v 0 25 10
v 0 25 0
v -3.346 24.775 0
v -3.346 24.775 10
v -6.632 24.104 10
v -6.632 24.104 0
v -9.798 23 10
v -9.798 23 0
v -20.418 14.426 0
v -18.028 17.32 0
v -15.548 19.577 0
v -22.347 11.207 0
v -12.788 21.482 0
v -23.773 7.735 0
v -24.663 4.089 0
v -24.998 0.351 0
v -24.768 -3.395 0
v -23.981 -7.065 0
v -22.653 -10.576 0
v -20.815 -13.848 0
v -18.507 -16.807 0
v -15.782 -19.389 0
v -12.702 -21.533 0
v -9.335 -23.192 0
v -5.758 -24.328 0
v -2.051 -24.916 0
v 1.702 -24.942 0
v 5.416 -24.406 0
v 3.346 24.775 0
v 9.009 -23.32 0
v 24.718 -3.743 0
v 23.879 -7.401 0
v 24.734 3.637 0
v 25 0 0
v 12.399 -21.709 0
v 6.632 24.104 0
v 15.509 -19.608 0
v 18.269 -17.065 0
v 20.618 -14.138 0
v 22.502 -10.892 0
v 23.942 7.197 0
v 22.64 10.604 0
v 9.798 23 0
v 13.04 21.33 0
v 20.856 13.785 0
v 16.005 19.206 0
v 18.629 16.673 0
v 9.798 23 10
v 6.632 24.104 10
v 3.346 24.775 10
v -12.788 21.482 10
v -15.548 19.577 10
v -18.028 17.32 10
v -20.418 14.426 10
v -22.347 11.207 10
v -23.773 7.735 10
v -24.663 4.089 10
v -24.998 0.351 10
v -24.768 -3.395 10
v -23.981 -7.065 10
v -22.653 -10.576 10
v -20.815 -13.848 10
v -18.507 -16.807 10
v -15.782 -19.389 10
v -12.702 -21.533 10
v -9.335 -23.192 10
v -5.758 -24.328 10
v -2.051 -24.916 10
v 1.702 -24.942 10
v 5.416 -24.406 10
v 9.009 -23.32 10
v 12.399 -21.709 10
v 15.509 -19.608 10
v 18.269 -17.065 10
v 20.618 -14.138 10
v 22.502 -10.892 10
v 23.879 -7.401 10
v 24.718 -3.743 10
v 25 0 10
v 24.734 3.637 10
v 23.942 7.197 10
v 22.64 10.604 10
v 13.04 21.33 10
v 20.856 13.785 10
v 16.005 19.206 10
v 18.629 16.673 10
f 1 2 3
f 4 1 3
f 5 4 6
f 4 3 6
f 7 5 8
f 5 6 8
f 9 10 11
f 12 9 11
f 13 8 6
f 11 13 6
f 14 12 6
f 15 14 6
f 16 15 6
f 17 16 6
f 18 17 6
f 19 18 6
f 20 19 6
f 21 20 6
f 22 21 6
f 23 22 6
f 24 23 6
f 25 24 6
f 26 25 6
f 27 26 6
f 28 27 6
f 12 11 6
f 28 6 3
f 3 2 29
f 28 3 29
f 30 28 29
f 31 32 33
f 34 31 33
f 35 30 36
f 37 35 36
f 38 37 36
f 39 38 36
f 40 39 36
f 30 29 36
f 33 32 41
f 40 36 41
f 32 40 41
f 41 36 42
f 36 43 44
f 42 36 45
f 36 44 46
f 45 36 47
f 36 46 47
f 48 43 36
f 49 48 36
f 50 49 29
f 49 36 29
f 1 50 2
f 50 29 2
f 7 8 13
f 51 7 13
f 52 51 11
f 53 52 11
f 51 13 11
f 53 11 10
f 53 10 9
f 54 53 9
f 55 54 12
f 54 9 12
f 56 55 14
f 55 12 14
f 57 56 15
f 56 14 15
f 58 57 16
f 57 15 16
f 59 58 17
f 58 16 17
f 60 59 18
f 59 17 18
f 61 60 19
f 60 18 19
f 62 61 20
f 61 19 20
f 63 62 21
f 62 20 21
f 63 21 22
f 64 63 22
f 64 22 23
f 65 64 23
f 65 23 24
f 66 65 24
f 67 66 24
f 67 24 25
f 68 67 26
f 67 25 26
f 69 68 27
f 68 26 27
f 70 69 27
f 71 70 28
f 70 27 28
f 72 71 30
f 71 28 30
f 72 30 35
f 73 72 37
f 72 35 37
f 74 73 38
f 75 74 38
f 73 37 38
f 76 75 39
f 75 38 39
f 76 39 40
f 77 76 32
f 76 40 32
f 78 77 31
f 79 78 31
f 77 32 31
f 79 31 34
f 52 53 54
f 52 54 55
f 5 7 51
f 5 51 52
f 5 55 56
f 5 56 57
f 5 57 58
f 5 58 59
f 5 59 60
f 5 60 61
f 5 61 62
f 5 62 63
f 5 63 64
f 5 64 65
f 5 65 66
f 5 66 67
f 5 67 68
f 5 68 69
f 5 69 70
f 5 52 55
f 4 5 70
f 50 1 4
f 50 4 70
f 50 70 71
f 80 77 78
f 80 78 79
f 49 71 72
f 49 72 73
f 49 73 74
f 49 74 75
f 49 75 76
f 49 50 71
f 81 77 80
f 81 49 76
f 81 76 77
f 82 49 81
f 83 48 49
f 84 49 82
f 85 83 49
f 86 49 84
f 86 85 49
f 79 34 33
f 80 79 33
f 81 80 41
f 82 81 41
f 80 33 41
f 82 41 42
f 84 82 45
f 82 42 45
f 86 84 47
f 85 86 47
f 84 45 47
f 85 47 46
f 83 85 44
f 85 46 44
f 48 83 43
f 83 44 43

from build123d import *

# Parameters (mm, degrees)
F1_DEPTH = 10


with BuildPart() as f1:
    # F0 (on Top) → F1 (new body)
    with BuildSketch(Plane.XY):
        with BuildLine():
            ThreePointArc((0.202041, 23), (0.151403, 24.00509), (0, 25))
            ThreePointArc((0, 25), (-5, 24.494897), (-9.797959, 23))
            ThreePointArc((-9.797959, 23), (-7.485281, 18.36897), (-3.166929, 15.514719))
            ThreePointArc((-3.166929, 15.514719), (-0.679014, 18.895752), (0.202041, 23))
        make_face()
        with BuildLine():
            ThreePointArc((-18.028245, 17.32), (-9.335253, -23.191659), (25, 0))
            ThreePointArc((25, 0), (20.856042, 13.784974), (9.797959, 23))
            ThreePointArc((9.797959, 23), (5, 16.339746), (-3.166929, 15.514719))
            ThreePointArc((-3.166929, 15.514719), (-11.003846, 13.072974), (-18.028245, 17.32))
        make_face()
        with BuildLine():
            ThreePointArc((-9.797959, 23), (-14.2, 20.575714), (-18.028245, 17.32))
            ThreePointArc((-18.028245, 17.32), (-11.003846, 13.072974), (-3.166929, 15.514719))
            ThreePointArc((-3.166929, 15.514719), (-7.485281, 18.36897), (-9.797959, 23))
        make_face()
        with BuildLine():
            ThreePointArc((-3.166929, 15.514719), (5, 16.339746), (9.797959, 23))
            ThreePointArc((9.797959, 23), (5, 24.494897), (0, 25))
            ThreePointArc((0, 25), (0.151403, 24.00509), (0.202041, 23))
            ThreePointArc((0.202041, 23), (-0.679014, 18.895752), (-3.166929, 15.514719))
        make_face()
    extrude(amount=F1_DEPTH)


solid = f1.part
